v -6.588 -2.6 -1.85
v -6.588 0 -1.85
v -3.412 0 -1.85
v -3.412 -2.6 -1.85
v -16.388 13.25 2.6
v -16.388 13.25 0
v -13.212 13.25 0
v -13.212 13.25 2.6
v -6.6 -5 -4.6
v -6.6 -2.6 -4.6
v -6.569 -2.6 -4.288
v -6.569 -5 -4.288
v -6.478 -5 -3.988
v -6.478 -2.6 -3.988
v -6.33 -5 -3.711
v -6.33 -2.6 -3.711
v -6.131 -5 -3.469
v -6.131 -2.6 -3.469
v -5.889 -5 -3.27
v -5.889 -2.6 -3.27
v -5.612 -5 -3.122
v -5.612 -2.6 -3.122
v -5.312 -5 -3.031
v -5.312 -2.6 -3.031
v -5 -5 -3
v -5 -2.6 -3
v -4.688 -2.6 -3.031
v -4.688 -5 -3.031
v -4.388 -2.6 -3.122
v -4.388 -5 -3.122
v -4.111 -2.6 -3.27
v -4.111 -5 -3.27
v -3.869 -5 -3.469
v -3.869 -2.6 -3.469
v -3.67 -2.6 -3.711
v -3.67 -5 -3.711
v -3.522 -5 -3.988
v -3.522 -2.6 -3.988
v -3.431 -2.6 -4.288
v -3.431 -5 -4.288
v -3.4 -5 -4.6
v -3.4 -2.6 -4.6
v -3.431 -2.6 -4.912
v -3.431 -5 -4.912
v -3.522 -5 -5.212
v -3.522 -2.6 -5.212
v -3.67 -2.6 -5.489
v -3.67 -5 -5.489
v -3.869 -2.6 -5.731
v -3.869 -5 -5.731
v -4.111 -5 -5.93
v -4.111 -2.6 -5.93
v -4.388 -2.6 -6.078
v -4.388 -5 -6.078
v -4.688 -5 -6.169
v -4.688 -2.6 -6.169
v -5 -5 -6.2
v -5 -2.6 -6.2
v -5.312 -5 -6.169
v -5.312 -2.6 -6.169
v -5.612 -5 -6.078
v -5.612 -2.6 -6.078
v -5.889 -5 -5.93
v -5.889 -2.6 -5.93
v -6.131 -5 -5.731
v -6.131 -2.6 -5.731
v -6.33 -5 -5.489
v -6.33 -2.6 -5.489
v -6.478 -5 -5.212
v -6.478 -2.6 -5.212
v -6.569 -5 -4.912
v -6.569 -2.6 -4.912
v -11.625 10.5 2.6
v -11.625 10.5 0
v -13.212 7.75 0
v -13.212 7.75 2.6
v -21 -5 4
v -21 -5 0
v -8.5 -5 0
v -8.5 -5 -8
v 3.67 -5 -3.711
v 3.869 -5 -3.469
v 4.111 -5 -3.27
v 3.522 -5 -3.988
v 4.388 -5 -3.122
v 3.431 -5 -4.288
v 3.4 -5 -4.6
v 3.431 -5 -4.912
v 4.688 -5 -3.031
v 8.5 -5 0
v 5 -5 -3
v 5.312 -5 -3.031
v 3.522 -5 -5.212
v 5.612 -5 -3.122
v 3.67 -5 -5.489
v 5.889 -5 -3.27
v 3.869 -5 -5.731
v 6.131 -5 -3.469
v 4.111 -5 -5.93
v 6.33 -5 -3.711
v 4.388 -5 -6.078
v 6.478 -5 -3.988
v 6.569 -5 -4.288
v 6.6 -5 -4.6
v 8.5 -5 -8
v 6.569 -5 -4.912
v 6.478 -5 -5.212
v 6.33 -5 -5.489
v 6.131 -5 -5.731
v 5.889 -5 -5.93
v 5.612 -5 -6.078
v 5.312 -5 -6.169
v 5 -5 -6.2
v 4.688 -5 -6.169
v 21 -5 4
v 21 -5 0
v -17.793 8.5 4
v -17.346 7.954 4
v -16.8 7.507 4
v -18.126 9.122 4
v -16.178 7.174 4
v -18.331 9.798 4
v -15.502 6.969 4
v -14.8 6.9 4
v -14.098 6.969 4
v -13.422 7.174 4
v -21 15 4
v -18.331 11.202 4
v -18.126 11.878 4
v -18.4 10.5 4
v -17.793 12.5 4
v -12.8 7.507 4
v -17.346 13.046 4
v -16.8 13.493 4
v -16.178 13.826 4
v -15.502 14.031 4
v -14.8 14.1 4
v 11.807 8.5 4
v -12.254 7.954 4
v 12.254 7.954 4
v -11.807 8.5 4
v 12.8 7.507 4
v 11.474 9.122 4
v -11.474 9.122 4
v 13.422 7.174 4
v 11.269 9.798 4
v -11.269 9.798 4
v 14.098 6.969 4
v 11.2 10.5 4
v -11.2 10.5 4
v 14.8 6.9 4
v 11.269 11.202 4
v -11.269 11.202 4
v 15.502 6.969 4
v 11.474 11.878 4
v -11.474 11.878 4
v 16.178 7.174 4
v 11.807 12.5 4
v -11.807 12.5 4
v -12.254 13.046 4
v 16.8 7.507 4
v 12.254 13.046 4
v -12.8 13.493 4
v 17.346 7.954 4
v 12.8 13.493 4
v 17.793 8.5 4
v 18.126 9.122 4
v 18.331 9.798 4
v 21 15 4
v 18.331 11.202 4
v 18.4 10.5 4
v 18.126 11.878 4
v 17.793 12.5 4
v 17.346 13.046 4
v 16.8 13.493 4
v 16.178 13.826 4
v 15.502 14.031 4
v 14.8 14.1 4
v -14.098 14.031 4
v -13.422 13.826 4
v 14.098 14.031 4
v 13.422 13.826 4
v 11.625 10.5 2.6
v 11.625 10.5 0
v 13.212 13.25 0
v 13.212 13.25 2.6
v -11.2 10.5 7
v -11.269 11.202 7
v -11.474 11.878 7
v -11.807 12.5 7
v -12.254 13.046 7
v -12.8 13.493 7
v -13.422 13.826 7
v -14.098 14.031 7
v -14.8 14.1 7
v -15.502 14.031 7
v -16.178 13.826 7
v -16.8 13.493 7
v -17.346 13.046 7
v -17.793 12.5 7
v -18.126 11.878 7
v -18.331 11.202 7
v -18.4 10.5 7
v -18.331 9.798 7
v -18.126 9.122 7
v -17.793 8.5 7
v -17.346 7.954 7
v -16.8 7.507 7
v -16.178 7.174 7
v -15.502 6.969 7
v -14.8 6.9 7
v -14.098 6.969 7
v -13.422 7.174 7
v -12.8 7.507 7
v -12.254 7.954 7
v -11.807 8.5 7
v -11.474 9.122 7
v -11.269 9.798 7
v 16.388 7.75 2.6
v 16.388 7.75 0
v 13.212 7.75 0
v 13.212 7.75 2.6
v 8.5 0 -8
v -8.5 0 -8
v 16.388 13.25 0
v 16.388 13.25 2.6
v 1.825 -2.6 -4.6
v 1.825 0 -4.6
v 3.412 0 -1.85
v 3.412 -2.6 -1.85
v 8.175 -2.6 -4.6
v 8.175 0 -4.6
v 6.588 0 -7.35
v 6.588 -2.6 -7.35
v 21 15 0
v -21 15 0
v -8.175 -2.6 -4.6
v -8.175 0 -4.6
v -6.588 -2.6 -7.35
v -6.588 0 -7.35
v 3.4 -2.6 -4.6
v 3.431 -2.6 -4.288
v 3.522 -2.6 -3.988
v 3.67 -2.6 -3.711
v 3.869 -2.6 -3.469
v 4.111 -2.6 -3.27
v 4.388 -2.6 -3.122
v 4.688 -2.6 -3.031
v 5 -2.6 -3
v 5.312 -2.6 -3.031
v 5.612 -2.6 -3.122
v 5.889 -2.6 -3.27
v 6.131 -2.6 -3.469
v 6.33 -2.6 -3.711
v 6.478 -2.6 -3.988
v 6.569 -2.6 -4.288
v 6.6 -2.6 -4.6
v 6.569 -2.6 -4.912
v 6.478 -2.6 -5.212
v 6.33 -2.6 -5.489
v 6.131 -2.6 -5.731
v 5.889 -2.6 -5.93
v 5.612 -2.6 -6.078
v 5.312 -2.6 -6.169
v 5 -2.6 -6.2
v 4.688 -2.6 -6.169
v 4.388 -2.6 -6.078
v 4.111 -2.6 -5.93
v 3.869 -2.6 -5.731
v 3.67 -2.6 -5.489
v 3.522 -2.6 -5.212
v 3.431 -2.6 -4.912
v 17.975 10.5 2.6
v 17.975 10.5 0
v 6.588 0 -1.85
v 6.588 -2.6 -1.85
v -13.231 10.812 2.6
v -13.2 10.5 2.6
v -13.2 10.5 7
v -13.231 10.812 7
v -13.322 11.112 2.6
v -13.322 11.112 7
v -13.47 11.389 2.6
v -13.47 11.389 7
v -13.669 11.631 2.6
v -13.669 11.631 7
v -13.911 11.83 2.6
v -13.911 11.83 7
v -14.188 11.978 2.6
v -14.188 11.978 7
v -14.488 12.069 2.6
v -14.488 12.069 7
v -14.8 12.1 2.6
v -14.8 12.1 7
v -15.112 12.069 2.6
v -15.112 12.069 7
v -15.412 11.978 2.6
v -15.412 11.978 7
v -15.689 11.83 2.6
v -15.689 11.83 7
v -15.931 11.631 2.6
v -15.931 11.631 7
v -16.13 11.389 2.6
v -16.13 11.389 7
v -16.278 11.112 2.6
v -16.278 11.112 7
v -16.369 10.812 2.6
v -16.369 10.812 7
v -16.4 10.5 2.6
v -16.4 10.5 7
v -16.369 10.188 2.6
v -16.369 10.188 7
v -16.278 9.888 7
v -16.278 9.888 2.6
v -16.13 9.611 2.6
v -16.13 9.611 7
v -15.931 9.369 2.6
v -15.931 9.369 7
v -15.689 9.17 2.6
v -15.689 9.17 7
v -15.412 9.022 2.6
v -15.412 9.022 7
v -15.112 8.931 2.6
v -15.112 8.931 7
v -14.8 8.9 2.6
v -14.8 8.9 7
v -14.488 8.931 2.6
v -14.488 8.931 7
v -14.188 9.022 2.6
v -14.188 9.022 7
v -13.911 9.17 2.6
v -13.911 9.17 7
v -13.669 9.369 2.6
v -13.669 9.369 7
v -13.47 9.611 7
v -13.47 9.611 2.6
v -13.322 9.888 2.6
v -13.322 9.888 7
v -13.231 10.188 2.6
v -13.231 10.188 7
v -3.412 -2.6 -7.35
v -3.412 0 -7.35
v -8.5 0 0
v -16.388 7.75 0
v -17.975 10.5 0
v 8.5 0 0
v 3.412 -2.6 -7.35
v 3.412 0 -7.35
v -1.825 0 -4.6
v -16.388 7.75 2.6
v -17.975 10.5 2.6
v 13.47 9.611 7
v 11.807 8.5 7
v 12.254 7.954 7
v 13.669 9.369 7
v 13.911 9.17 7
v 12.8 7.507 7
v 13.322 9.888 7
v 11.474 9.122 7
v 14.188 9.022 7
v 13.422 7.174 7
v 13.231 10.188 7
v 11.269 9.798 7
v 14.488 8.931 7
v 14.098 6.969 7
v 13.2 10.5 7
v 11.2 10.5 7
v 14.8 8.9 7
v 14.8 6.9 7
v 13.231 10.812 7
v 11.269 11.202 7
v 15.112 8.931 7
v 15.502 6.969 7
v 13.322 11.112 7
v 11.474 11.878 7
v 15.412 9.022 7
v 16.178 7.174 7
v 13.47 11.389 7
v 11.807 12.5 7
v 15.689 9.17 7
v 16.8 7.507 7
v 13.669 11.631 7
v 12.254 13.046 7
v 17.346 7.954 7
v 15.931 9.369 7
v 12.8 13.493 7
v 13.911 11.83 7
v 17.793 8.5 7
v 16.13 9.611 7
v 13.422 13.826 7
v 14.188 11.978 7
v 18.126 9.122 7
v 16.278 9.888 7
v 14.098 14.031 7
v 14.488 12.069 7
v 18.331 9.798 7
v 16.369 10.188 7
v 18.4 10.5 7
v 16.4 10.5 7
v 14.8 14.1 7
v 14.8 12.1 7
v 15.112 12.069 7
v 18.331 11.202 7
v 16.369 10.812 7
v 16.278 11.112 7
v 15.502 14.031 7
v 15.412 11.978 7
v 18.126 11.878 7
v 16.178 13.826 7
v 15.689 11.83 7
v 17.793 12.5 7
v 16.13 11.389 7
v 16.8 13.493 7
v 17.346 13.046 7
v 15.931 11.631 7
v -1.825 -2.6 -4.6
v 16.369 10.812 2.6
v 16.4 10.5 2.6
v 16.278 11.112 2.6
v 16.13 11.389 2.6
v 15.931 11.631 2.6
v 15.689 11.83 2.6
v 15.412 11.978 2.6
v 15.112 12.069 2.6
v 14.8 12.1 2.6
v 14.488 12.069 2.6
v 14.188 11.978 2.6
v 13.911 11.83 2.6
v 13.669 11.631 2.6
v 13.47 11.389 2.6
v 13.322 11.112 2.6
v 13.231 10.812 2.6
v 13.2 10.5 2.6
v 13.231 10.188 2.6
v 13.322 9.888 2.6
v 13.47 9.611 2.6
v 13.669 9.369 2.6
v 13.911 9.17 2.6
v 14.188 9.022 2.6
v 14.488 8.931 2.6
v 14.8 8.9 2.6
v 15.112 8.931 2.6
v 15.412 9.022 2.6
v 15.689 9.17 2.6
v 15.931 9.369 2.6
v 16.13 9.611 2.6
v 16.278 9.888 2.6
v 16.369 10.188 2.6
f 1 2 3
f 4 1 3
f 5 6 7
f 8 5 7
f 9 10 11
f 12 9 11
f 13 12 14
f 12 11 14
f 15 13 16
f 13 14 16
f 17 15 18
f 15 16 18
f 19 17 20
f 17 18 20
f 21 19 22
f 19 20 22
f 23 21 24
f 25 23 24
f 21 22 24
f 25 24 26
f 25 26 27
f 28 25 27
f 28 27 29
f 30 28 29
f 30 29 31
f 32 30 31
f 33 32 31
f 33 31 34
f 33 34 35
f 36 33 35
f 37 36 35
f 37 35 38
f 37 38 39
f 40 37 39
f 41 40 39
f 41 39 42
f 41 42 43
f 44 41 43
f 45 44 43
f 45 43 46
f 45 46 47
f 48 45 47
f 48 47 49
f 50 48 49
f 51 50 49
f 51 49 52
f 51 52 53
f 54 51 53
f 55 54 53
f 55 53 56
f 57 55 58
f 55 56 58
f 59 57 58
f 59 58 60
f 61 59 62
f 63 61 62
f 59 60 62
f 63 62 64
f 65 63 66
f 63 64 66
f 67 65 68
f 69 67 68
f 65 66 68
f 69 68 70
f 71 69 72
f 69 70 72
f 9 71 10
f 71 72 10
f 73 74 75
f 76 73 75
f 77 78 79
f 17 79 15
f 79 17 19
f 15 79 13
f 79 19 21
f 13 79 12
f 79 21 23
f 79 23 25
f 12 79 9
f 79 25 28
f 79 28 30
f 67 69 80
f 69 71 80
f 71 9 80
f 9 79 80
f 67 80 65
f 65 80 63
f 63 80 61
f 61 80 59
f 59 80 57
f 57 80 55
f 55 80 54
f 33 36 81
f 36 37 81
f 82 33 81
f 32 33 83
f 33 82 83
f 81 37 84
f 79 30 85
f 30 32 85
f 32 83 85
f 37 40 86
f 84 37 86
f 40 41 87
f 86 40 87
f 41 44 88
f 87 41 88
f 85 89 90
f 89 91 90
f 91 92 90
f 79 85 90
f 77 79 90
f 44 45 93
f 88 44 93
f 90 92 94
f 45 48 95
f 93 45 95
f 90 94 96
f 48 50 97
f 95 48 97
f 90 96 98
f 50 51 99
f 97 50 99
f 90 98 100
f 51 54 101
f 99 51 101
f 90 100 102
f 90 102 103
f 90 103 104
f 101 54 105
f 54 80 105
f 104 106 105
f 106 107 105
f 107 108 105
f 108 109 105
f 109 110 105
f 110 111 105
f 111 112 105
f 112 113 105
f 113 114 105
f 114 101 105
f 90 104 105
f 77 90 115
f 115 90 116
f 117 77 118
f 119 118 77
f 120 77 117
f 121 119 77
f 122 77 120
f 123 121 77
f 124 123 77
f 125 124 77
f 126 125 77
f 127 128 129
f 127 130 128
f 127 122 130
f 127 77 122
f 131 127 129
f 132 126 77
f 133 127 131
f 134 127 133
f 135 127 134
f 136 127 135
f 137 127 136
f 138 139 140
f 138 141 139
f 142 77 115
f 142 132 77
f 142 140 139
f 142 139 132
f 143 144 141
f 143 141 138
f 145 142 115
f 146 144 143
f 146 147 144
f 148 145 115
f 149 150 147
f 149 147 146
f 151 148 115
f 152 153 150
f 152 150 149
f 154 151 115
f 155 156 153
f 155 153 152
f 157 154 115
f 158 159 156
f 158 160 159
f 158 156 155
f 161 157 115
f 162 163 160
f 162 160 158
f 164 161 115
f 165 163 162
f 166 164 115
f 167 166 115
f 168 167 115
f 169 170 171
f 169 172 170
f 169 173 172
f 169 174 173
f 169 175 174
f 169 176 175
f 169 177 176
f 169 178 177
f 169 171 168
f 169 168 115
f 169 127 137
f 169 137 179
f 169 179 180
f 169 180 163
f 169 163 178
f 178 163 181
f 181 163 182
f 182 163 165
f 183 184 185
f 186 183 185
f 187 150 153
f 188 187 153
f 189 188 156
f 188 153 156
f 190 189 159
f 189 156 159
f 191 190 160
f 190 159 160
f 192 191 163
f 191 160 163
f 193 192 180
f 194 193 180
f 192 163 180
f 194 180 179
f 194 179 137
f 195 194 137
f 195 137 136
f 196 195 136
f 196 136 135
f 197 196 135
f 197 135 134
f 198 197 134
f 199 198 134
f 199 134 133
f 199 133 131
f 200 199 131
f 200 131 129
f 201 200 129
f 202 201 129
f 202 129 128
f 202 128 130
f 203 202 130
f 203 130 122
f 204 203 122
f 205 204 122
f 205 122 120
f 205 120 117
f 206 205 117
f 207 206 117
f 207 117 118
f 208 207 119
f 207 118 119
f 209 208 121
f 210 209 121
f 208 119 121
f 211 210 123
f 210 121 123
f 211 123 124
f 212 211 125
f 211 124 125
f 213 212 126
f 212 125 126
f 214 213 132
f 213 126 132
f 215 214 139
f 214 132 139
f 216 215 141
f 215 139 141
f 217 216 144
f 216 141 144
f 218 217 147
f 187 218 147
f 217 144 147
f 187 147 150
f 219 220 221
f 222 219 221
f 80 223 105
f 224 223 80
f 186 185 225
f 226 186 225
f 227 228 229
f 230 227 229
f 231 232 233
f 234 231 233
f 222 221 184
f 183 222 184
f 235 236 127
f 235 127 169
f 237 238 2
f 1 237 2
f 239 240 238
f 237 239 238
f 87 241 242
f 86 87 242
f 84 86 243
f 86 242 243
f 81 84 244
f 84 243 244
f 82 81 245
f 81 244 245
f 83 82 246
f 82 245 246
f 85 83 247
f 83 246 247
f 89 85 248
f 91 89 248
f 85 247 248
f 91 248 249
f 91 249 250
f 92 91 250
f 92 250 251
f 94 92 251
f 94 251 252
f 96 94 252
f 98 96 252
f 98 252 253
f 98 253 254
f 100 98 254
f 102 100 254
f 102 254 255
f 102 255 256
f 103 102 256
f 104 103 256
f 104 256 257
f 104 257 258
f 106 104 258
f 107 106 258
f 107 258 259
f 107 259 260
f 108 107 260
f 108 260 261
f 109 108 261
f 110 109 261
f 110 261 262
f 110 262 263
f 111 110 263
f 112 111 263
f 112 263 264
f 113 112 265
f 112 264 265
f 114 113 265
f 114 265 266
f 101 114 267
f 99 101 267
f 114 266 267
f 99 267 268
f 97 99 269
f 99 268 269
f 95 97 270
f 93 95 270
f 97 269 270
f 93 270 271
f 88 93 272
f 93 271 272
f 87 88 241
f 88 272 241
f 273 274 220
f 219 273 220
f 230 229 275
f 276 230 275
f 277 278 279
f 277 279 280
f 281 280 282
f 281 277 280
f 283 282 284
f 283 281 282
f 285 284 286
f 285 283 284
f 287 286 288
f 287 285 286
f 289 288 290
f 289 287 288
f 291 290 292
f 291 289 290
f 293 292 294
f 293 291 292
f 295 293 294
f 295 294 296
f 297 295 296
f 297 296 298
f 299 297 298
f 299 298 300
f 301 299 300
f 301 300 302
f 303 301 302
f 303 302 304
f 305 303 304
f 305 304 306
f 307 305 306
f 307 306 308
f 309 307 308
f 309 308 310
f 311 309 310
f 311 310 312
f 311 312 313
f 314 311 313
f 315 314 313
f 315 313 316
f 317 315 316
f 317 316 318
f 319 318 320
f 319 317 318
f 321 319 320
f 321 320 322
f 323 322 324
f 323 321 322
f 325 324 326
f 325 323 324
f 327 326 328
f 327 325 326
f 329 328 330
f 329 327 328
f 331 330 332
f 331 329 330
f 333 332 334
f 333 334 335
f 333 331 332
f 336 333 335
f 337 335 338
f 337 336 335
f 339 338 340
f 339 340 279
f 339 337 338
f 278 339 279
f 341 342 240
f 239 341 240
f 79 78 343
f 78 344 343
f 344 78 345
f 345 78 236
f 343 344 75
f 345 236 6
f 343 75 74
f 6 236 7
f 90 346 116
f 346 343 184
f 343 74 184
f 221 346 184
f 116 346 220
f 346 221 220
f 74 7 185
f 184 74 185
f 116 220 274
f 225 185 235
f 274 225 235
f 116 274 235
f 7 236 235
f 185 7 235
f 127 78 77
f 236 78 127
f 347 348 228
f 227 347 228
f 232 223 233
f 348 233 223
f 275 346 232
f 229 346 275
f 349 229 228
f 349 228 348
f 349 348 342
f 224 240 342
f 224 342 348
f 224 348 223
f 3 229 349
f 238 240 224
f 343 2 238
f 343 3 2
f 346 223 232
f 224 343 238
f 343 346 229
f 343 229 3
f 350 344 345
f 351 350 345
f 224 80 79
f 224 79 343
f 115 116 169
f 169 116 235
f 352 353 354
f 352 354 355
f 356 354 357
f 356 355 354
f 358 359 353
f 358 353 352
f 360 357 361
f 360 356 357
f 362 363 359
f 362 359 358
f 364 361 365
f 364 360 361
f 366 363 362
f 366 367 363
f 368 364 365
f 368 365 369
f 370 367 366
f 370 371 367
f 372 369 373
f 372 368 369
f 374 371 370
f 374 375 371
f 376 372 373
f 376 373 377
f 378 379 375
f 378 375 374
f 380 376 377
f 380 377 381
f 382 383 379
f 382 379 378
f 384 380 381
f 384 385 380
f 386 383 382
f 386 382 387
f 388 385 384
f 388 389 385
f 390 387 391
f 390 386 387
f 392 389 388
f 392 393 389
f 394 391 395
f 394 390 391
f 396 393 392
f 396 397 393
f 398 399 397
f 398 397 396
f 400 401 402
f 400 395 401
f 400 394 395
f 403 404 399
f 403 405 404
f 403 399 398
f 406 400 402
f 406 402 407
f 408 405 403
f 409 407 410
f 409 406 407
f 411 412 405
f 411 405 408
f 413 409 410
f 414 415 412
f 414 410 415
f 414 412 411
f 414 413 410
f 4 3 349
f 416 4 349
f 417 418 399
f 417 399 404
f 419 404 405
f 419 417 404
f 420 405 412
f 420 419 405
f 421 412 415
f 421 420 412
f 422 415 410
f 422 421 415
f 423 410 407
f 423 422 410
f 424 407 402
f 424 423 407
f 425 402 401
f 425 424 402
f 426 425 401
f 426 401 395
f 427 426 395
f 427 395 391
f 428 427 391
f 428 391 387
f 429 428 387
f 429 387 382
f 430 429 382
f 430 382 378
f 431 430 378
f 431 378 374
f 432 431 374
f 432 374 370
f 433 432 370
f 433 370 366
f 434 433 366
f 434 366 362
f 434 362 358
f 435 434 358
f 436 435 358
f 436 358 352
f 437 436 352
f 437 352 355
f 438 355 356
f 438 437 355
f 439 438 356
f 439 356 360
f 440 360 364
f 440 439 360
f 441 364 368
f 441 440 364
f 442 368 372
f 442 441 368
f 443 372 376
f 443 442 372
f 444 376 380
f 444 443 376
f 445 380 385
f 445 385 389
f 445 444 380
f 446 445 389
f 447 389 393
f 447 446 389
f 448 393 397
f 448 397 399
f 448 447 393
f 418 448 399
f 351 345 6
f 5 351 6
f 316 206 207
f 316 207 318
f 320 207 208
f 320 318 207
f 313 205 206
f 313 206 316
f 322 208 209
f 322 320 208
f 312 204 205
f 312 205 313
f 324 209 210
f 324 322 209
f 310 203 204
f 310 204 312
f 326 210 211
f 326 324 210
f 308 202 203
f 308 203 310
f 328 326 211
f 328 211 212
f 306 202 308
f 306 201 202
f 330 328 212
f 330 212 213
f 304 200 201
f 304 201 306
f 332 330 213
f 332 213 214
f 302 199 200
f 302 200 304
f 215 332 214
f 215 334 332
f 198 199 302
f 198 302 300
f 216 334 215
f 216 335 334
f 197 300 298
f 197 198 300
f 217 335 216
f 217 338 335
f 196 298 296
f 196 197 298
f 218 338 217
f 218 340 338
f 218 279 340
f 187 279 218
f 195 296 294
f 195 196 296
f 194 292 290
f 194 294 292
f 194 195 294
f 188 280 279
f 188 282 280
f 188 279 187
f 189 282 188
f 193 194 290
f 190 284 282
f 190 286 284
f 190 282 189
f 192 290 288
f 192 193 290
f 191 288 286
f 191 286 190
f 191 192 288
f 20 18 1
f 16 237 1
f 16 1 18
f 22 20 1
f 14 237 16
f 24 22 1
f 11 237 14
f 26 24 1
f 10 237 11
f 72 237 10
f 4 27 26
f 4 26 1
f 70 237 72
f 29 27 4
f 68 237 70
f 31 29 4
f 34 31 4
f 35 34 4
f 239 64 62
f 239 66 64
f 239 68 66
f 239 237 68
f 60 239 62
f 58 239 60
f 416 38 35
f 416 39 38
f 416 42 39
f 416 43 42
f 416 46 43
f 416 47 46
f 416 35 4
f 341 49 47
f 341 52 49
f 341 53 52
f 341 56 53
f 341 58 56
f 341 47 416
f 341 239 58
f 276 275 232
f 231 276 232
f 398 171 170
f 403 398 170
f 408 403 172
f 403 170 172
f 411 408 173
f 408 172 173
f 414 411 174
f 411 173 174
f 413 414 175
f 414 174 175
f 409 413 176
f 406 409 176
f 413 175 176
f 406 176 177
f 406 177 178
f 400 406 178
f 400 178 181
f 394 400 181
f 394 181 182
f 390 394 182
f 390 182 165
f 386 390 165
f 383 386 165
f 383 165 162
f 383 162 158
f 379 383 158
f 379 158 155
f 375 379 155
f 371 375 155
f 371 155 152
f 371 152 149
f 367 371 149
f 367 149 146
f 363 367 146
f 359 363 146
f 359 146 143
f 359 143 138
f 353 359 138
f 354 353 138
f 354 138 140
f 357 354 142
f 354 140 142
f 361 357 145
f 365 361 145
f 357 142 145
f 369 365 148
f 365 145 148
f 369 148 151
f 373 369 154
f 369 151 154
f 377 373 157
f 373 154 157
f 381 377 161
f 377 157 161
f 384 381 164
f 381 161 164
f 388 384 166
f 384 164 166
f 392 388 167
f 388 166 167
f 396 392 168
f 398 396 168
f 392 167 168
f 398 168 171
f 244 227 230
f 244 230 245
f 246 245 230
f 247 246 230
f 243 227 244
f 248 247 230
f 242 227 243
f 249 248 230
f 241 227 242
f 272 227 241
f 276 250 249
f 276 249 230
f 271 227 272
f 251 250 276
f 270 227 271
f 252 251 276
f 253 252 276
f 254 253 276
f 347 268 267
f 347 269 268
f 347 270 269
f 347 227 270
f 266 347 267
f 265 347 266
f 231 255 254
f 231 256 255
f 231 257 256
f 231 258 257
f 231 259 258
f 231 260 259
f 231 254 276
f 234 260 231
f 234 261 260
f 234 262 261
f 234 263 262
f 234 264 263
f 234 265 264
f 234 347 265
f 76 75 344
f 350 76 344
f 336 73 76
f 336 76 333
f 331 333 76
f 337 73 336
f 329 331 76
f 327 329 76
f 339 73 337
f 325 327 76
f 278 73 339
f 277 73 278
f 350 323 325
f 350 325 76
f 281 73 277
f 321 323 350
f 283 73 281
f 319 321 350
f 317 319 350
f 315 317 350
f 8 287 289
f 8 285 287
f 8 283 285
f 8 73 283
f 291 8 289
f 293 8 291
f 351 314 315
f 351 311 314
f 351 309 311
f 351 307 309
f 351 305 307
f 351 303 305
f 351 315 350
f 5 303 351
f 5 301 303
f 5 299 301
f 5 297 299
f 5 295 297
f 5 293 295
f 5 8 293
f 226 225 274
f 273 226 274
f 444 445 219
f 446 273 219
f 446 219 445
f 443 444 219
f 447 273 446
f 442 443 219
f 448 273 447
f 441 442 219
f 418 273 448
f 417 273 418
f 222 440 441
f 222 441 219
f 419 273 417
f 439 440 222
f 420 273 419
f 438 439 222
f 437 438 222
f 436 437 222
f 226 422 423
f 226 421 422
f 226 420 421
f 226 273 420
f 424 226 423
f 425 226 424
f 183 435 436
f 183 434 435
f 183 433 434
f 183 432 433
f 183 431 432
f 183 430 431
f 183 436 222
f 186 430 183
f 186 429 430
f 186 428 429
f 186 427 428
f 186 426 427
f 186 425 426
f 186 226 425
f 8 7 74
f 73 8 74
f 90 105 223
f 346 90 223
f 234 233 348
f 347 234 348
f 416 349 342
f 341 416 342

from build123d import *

# Parameters (mm, degrees)
SKETCH_1_W          = 42
SKETCH_1_H          = 20
SKETCH_1_R          = 3.6
EXTRUDE_1_DEPTH     = 4
SKETCH_1_3_R        = 3.6
SKETCH_1_3_R_2      = 1.6
EXTRUDE_2_DEPTH     = 7
CUT_EXTRUDE_3_DEPTH = 2.6
SKETCH_7_W          = 17
SKETCH_7_H          = 5
EXTRUDE_4_DEPTH     = 8
SKETCH_8_R          = 1.6
CUT_EXTRUDE_4_DEPTH = 6.6
CUT_EXTRUDE_5_DEPTH = 2.6


with BuildPart() as part:
    # 草图1 → 凸台-拉伸1 (new body)
    with BuildSketch(Plane.XY):
        with Locations((0, 5)):
            Rectangle(SKETCH_1_W, SKETCH_1_H)
        with Locations((14.8, 10.5)):
            Circle(SKETCH_1_R, mode=Mode.SUBTRACT)
        with Locations((-14.8, 10.5)):
            Circle(SKETCH_1_R, mode=Mode.SUBTRACT)
    extrude(amount=EXTRUDE_1_DEPTH)

    # 草图1<3> → 凸台-拉伸2 (add)
    # profile 1 of 2: a face of its own
    with BuildSketch(Plane.XY):
        with Locations((-14.8, 10.5)):
            Circle(SKETCH_1_3_R)
        with Locations((-14.8, 10.5)):
            Circle(SKETCH_1_3_R_2, mode=Mode.SUBTRACT)
    # profile 2 of 2: a face of its own
    with BuildSketch(Plane.XY):
        with Locations((14.8, 10.5)):
            Circle(SKETCH_1_3_R)
        with Locations((14.8, 10.5)):
            Circle(SKETCH_1_3_R_2, mode=Mode.SUBTRACT)
    extrude(amount=EXTRUDE_2_DEPTH)

    # 草图6 → 切除-拉伸3 (cut)
    with BuildSketch(Plane(origin=(0, 0, 0), x_dir=(-1, 0, 0), z_dir=(0, 0, -1))):
        Polygon((-11.624573519, 10.5), (-13.21228676, 13.25), (-16.38771324, 13.25), (-17.975426481, 10.5), (-16.38771324, 7.75), (-13.21228676, 7.75), align=None)
        Polygon((17.975426481, 10.5), (16.38771324, 13.25), (13.21228676, 13.25), (11.624573519, 10.5), (13.21228676, 7.75), (16.38771324, 7.75), align=None)
    extrude(amount=-CUT_EXTRUDE_3_DEPTH, mode=Mode.SUBTRACT)

    # 草图7 → 凸台-拉伸4 (add)
    with BuildSketch(Plane(origin=(0, 0, 0), x_dir=(-1, 0, 0), z_dir=(0, 0, -1))):
        with Locations((0, -2.5)):
            Rectangle(SKETCH_7_W, SKETCH_7_H)
    extrude(amount=EXTRUDE_4_DEPTH)

    # 草图8 → 切除-拉伸4 (cut)
    with BuildSketch(Plane(origin=(0, 0, 0), x_dir=(1, 0, 0), z_dir=(0, 1, 0))):
        with Locations((-5, 4.6)):
            Circle(SKETCH_8_R)
        with Locations((5, 4.6)):
            Circle(SKETCH_8_R)
    extrude(amount=-CUT_EXTRUDE_4_DEPTH, mode=Mode.SUBTRACT)

    # 草图9 → 切除-拉伸5 (cut)
    with BuildSketch(Plane(origin=(0, 0, 0), x_dir=(1, 0, 0), z_dir=(0, 1, 0))):
        Polygon((1.824573519, 4.6), (3.41228676, 1.85), (6.58771324, 1.85), (8.175426481, 4.6), (6.58771324, 7.35), (3.41228676, 7.35), align=None)
        Polygon((-8.175426481, 4.6), (-6.58771324, 1.85), (-3.41228676, 1.85), (-1.824573519, 4.6), (-3.41228676, 7.35), (-6.58771324, 7.35), align=None)
    extrude(amount=-CUT_EXTRUDE_5_DEPTH, mode=Mode.SUBTRACT)


solid = part.part
